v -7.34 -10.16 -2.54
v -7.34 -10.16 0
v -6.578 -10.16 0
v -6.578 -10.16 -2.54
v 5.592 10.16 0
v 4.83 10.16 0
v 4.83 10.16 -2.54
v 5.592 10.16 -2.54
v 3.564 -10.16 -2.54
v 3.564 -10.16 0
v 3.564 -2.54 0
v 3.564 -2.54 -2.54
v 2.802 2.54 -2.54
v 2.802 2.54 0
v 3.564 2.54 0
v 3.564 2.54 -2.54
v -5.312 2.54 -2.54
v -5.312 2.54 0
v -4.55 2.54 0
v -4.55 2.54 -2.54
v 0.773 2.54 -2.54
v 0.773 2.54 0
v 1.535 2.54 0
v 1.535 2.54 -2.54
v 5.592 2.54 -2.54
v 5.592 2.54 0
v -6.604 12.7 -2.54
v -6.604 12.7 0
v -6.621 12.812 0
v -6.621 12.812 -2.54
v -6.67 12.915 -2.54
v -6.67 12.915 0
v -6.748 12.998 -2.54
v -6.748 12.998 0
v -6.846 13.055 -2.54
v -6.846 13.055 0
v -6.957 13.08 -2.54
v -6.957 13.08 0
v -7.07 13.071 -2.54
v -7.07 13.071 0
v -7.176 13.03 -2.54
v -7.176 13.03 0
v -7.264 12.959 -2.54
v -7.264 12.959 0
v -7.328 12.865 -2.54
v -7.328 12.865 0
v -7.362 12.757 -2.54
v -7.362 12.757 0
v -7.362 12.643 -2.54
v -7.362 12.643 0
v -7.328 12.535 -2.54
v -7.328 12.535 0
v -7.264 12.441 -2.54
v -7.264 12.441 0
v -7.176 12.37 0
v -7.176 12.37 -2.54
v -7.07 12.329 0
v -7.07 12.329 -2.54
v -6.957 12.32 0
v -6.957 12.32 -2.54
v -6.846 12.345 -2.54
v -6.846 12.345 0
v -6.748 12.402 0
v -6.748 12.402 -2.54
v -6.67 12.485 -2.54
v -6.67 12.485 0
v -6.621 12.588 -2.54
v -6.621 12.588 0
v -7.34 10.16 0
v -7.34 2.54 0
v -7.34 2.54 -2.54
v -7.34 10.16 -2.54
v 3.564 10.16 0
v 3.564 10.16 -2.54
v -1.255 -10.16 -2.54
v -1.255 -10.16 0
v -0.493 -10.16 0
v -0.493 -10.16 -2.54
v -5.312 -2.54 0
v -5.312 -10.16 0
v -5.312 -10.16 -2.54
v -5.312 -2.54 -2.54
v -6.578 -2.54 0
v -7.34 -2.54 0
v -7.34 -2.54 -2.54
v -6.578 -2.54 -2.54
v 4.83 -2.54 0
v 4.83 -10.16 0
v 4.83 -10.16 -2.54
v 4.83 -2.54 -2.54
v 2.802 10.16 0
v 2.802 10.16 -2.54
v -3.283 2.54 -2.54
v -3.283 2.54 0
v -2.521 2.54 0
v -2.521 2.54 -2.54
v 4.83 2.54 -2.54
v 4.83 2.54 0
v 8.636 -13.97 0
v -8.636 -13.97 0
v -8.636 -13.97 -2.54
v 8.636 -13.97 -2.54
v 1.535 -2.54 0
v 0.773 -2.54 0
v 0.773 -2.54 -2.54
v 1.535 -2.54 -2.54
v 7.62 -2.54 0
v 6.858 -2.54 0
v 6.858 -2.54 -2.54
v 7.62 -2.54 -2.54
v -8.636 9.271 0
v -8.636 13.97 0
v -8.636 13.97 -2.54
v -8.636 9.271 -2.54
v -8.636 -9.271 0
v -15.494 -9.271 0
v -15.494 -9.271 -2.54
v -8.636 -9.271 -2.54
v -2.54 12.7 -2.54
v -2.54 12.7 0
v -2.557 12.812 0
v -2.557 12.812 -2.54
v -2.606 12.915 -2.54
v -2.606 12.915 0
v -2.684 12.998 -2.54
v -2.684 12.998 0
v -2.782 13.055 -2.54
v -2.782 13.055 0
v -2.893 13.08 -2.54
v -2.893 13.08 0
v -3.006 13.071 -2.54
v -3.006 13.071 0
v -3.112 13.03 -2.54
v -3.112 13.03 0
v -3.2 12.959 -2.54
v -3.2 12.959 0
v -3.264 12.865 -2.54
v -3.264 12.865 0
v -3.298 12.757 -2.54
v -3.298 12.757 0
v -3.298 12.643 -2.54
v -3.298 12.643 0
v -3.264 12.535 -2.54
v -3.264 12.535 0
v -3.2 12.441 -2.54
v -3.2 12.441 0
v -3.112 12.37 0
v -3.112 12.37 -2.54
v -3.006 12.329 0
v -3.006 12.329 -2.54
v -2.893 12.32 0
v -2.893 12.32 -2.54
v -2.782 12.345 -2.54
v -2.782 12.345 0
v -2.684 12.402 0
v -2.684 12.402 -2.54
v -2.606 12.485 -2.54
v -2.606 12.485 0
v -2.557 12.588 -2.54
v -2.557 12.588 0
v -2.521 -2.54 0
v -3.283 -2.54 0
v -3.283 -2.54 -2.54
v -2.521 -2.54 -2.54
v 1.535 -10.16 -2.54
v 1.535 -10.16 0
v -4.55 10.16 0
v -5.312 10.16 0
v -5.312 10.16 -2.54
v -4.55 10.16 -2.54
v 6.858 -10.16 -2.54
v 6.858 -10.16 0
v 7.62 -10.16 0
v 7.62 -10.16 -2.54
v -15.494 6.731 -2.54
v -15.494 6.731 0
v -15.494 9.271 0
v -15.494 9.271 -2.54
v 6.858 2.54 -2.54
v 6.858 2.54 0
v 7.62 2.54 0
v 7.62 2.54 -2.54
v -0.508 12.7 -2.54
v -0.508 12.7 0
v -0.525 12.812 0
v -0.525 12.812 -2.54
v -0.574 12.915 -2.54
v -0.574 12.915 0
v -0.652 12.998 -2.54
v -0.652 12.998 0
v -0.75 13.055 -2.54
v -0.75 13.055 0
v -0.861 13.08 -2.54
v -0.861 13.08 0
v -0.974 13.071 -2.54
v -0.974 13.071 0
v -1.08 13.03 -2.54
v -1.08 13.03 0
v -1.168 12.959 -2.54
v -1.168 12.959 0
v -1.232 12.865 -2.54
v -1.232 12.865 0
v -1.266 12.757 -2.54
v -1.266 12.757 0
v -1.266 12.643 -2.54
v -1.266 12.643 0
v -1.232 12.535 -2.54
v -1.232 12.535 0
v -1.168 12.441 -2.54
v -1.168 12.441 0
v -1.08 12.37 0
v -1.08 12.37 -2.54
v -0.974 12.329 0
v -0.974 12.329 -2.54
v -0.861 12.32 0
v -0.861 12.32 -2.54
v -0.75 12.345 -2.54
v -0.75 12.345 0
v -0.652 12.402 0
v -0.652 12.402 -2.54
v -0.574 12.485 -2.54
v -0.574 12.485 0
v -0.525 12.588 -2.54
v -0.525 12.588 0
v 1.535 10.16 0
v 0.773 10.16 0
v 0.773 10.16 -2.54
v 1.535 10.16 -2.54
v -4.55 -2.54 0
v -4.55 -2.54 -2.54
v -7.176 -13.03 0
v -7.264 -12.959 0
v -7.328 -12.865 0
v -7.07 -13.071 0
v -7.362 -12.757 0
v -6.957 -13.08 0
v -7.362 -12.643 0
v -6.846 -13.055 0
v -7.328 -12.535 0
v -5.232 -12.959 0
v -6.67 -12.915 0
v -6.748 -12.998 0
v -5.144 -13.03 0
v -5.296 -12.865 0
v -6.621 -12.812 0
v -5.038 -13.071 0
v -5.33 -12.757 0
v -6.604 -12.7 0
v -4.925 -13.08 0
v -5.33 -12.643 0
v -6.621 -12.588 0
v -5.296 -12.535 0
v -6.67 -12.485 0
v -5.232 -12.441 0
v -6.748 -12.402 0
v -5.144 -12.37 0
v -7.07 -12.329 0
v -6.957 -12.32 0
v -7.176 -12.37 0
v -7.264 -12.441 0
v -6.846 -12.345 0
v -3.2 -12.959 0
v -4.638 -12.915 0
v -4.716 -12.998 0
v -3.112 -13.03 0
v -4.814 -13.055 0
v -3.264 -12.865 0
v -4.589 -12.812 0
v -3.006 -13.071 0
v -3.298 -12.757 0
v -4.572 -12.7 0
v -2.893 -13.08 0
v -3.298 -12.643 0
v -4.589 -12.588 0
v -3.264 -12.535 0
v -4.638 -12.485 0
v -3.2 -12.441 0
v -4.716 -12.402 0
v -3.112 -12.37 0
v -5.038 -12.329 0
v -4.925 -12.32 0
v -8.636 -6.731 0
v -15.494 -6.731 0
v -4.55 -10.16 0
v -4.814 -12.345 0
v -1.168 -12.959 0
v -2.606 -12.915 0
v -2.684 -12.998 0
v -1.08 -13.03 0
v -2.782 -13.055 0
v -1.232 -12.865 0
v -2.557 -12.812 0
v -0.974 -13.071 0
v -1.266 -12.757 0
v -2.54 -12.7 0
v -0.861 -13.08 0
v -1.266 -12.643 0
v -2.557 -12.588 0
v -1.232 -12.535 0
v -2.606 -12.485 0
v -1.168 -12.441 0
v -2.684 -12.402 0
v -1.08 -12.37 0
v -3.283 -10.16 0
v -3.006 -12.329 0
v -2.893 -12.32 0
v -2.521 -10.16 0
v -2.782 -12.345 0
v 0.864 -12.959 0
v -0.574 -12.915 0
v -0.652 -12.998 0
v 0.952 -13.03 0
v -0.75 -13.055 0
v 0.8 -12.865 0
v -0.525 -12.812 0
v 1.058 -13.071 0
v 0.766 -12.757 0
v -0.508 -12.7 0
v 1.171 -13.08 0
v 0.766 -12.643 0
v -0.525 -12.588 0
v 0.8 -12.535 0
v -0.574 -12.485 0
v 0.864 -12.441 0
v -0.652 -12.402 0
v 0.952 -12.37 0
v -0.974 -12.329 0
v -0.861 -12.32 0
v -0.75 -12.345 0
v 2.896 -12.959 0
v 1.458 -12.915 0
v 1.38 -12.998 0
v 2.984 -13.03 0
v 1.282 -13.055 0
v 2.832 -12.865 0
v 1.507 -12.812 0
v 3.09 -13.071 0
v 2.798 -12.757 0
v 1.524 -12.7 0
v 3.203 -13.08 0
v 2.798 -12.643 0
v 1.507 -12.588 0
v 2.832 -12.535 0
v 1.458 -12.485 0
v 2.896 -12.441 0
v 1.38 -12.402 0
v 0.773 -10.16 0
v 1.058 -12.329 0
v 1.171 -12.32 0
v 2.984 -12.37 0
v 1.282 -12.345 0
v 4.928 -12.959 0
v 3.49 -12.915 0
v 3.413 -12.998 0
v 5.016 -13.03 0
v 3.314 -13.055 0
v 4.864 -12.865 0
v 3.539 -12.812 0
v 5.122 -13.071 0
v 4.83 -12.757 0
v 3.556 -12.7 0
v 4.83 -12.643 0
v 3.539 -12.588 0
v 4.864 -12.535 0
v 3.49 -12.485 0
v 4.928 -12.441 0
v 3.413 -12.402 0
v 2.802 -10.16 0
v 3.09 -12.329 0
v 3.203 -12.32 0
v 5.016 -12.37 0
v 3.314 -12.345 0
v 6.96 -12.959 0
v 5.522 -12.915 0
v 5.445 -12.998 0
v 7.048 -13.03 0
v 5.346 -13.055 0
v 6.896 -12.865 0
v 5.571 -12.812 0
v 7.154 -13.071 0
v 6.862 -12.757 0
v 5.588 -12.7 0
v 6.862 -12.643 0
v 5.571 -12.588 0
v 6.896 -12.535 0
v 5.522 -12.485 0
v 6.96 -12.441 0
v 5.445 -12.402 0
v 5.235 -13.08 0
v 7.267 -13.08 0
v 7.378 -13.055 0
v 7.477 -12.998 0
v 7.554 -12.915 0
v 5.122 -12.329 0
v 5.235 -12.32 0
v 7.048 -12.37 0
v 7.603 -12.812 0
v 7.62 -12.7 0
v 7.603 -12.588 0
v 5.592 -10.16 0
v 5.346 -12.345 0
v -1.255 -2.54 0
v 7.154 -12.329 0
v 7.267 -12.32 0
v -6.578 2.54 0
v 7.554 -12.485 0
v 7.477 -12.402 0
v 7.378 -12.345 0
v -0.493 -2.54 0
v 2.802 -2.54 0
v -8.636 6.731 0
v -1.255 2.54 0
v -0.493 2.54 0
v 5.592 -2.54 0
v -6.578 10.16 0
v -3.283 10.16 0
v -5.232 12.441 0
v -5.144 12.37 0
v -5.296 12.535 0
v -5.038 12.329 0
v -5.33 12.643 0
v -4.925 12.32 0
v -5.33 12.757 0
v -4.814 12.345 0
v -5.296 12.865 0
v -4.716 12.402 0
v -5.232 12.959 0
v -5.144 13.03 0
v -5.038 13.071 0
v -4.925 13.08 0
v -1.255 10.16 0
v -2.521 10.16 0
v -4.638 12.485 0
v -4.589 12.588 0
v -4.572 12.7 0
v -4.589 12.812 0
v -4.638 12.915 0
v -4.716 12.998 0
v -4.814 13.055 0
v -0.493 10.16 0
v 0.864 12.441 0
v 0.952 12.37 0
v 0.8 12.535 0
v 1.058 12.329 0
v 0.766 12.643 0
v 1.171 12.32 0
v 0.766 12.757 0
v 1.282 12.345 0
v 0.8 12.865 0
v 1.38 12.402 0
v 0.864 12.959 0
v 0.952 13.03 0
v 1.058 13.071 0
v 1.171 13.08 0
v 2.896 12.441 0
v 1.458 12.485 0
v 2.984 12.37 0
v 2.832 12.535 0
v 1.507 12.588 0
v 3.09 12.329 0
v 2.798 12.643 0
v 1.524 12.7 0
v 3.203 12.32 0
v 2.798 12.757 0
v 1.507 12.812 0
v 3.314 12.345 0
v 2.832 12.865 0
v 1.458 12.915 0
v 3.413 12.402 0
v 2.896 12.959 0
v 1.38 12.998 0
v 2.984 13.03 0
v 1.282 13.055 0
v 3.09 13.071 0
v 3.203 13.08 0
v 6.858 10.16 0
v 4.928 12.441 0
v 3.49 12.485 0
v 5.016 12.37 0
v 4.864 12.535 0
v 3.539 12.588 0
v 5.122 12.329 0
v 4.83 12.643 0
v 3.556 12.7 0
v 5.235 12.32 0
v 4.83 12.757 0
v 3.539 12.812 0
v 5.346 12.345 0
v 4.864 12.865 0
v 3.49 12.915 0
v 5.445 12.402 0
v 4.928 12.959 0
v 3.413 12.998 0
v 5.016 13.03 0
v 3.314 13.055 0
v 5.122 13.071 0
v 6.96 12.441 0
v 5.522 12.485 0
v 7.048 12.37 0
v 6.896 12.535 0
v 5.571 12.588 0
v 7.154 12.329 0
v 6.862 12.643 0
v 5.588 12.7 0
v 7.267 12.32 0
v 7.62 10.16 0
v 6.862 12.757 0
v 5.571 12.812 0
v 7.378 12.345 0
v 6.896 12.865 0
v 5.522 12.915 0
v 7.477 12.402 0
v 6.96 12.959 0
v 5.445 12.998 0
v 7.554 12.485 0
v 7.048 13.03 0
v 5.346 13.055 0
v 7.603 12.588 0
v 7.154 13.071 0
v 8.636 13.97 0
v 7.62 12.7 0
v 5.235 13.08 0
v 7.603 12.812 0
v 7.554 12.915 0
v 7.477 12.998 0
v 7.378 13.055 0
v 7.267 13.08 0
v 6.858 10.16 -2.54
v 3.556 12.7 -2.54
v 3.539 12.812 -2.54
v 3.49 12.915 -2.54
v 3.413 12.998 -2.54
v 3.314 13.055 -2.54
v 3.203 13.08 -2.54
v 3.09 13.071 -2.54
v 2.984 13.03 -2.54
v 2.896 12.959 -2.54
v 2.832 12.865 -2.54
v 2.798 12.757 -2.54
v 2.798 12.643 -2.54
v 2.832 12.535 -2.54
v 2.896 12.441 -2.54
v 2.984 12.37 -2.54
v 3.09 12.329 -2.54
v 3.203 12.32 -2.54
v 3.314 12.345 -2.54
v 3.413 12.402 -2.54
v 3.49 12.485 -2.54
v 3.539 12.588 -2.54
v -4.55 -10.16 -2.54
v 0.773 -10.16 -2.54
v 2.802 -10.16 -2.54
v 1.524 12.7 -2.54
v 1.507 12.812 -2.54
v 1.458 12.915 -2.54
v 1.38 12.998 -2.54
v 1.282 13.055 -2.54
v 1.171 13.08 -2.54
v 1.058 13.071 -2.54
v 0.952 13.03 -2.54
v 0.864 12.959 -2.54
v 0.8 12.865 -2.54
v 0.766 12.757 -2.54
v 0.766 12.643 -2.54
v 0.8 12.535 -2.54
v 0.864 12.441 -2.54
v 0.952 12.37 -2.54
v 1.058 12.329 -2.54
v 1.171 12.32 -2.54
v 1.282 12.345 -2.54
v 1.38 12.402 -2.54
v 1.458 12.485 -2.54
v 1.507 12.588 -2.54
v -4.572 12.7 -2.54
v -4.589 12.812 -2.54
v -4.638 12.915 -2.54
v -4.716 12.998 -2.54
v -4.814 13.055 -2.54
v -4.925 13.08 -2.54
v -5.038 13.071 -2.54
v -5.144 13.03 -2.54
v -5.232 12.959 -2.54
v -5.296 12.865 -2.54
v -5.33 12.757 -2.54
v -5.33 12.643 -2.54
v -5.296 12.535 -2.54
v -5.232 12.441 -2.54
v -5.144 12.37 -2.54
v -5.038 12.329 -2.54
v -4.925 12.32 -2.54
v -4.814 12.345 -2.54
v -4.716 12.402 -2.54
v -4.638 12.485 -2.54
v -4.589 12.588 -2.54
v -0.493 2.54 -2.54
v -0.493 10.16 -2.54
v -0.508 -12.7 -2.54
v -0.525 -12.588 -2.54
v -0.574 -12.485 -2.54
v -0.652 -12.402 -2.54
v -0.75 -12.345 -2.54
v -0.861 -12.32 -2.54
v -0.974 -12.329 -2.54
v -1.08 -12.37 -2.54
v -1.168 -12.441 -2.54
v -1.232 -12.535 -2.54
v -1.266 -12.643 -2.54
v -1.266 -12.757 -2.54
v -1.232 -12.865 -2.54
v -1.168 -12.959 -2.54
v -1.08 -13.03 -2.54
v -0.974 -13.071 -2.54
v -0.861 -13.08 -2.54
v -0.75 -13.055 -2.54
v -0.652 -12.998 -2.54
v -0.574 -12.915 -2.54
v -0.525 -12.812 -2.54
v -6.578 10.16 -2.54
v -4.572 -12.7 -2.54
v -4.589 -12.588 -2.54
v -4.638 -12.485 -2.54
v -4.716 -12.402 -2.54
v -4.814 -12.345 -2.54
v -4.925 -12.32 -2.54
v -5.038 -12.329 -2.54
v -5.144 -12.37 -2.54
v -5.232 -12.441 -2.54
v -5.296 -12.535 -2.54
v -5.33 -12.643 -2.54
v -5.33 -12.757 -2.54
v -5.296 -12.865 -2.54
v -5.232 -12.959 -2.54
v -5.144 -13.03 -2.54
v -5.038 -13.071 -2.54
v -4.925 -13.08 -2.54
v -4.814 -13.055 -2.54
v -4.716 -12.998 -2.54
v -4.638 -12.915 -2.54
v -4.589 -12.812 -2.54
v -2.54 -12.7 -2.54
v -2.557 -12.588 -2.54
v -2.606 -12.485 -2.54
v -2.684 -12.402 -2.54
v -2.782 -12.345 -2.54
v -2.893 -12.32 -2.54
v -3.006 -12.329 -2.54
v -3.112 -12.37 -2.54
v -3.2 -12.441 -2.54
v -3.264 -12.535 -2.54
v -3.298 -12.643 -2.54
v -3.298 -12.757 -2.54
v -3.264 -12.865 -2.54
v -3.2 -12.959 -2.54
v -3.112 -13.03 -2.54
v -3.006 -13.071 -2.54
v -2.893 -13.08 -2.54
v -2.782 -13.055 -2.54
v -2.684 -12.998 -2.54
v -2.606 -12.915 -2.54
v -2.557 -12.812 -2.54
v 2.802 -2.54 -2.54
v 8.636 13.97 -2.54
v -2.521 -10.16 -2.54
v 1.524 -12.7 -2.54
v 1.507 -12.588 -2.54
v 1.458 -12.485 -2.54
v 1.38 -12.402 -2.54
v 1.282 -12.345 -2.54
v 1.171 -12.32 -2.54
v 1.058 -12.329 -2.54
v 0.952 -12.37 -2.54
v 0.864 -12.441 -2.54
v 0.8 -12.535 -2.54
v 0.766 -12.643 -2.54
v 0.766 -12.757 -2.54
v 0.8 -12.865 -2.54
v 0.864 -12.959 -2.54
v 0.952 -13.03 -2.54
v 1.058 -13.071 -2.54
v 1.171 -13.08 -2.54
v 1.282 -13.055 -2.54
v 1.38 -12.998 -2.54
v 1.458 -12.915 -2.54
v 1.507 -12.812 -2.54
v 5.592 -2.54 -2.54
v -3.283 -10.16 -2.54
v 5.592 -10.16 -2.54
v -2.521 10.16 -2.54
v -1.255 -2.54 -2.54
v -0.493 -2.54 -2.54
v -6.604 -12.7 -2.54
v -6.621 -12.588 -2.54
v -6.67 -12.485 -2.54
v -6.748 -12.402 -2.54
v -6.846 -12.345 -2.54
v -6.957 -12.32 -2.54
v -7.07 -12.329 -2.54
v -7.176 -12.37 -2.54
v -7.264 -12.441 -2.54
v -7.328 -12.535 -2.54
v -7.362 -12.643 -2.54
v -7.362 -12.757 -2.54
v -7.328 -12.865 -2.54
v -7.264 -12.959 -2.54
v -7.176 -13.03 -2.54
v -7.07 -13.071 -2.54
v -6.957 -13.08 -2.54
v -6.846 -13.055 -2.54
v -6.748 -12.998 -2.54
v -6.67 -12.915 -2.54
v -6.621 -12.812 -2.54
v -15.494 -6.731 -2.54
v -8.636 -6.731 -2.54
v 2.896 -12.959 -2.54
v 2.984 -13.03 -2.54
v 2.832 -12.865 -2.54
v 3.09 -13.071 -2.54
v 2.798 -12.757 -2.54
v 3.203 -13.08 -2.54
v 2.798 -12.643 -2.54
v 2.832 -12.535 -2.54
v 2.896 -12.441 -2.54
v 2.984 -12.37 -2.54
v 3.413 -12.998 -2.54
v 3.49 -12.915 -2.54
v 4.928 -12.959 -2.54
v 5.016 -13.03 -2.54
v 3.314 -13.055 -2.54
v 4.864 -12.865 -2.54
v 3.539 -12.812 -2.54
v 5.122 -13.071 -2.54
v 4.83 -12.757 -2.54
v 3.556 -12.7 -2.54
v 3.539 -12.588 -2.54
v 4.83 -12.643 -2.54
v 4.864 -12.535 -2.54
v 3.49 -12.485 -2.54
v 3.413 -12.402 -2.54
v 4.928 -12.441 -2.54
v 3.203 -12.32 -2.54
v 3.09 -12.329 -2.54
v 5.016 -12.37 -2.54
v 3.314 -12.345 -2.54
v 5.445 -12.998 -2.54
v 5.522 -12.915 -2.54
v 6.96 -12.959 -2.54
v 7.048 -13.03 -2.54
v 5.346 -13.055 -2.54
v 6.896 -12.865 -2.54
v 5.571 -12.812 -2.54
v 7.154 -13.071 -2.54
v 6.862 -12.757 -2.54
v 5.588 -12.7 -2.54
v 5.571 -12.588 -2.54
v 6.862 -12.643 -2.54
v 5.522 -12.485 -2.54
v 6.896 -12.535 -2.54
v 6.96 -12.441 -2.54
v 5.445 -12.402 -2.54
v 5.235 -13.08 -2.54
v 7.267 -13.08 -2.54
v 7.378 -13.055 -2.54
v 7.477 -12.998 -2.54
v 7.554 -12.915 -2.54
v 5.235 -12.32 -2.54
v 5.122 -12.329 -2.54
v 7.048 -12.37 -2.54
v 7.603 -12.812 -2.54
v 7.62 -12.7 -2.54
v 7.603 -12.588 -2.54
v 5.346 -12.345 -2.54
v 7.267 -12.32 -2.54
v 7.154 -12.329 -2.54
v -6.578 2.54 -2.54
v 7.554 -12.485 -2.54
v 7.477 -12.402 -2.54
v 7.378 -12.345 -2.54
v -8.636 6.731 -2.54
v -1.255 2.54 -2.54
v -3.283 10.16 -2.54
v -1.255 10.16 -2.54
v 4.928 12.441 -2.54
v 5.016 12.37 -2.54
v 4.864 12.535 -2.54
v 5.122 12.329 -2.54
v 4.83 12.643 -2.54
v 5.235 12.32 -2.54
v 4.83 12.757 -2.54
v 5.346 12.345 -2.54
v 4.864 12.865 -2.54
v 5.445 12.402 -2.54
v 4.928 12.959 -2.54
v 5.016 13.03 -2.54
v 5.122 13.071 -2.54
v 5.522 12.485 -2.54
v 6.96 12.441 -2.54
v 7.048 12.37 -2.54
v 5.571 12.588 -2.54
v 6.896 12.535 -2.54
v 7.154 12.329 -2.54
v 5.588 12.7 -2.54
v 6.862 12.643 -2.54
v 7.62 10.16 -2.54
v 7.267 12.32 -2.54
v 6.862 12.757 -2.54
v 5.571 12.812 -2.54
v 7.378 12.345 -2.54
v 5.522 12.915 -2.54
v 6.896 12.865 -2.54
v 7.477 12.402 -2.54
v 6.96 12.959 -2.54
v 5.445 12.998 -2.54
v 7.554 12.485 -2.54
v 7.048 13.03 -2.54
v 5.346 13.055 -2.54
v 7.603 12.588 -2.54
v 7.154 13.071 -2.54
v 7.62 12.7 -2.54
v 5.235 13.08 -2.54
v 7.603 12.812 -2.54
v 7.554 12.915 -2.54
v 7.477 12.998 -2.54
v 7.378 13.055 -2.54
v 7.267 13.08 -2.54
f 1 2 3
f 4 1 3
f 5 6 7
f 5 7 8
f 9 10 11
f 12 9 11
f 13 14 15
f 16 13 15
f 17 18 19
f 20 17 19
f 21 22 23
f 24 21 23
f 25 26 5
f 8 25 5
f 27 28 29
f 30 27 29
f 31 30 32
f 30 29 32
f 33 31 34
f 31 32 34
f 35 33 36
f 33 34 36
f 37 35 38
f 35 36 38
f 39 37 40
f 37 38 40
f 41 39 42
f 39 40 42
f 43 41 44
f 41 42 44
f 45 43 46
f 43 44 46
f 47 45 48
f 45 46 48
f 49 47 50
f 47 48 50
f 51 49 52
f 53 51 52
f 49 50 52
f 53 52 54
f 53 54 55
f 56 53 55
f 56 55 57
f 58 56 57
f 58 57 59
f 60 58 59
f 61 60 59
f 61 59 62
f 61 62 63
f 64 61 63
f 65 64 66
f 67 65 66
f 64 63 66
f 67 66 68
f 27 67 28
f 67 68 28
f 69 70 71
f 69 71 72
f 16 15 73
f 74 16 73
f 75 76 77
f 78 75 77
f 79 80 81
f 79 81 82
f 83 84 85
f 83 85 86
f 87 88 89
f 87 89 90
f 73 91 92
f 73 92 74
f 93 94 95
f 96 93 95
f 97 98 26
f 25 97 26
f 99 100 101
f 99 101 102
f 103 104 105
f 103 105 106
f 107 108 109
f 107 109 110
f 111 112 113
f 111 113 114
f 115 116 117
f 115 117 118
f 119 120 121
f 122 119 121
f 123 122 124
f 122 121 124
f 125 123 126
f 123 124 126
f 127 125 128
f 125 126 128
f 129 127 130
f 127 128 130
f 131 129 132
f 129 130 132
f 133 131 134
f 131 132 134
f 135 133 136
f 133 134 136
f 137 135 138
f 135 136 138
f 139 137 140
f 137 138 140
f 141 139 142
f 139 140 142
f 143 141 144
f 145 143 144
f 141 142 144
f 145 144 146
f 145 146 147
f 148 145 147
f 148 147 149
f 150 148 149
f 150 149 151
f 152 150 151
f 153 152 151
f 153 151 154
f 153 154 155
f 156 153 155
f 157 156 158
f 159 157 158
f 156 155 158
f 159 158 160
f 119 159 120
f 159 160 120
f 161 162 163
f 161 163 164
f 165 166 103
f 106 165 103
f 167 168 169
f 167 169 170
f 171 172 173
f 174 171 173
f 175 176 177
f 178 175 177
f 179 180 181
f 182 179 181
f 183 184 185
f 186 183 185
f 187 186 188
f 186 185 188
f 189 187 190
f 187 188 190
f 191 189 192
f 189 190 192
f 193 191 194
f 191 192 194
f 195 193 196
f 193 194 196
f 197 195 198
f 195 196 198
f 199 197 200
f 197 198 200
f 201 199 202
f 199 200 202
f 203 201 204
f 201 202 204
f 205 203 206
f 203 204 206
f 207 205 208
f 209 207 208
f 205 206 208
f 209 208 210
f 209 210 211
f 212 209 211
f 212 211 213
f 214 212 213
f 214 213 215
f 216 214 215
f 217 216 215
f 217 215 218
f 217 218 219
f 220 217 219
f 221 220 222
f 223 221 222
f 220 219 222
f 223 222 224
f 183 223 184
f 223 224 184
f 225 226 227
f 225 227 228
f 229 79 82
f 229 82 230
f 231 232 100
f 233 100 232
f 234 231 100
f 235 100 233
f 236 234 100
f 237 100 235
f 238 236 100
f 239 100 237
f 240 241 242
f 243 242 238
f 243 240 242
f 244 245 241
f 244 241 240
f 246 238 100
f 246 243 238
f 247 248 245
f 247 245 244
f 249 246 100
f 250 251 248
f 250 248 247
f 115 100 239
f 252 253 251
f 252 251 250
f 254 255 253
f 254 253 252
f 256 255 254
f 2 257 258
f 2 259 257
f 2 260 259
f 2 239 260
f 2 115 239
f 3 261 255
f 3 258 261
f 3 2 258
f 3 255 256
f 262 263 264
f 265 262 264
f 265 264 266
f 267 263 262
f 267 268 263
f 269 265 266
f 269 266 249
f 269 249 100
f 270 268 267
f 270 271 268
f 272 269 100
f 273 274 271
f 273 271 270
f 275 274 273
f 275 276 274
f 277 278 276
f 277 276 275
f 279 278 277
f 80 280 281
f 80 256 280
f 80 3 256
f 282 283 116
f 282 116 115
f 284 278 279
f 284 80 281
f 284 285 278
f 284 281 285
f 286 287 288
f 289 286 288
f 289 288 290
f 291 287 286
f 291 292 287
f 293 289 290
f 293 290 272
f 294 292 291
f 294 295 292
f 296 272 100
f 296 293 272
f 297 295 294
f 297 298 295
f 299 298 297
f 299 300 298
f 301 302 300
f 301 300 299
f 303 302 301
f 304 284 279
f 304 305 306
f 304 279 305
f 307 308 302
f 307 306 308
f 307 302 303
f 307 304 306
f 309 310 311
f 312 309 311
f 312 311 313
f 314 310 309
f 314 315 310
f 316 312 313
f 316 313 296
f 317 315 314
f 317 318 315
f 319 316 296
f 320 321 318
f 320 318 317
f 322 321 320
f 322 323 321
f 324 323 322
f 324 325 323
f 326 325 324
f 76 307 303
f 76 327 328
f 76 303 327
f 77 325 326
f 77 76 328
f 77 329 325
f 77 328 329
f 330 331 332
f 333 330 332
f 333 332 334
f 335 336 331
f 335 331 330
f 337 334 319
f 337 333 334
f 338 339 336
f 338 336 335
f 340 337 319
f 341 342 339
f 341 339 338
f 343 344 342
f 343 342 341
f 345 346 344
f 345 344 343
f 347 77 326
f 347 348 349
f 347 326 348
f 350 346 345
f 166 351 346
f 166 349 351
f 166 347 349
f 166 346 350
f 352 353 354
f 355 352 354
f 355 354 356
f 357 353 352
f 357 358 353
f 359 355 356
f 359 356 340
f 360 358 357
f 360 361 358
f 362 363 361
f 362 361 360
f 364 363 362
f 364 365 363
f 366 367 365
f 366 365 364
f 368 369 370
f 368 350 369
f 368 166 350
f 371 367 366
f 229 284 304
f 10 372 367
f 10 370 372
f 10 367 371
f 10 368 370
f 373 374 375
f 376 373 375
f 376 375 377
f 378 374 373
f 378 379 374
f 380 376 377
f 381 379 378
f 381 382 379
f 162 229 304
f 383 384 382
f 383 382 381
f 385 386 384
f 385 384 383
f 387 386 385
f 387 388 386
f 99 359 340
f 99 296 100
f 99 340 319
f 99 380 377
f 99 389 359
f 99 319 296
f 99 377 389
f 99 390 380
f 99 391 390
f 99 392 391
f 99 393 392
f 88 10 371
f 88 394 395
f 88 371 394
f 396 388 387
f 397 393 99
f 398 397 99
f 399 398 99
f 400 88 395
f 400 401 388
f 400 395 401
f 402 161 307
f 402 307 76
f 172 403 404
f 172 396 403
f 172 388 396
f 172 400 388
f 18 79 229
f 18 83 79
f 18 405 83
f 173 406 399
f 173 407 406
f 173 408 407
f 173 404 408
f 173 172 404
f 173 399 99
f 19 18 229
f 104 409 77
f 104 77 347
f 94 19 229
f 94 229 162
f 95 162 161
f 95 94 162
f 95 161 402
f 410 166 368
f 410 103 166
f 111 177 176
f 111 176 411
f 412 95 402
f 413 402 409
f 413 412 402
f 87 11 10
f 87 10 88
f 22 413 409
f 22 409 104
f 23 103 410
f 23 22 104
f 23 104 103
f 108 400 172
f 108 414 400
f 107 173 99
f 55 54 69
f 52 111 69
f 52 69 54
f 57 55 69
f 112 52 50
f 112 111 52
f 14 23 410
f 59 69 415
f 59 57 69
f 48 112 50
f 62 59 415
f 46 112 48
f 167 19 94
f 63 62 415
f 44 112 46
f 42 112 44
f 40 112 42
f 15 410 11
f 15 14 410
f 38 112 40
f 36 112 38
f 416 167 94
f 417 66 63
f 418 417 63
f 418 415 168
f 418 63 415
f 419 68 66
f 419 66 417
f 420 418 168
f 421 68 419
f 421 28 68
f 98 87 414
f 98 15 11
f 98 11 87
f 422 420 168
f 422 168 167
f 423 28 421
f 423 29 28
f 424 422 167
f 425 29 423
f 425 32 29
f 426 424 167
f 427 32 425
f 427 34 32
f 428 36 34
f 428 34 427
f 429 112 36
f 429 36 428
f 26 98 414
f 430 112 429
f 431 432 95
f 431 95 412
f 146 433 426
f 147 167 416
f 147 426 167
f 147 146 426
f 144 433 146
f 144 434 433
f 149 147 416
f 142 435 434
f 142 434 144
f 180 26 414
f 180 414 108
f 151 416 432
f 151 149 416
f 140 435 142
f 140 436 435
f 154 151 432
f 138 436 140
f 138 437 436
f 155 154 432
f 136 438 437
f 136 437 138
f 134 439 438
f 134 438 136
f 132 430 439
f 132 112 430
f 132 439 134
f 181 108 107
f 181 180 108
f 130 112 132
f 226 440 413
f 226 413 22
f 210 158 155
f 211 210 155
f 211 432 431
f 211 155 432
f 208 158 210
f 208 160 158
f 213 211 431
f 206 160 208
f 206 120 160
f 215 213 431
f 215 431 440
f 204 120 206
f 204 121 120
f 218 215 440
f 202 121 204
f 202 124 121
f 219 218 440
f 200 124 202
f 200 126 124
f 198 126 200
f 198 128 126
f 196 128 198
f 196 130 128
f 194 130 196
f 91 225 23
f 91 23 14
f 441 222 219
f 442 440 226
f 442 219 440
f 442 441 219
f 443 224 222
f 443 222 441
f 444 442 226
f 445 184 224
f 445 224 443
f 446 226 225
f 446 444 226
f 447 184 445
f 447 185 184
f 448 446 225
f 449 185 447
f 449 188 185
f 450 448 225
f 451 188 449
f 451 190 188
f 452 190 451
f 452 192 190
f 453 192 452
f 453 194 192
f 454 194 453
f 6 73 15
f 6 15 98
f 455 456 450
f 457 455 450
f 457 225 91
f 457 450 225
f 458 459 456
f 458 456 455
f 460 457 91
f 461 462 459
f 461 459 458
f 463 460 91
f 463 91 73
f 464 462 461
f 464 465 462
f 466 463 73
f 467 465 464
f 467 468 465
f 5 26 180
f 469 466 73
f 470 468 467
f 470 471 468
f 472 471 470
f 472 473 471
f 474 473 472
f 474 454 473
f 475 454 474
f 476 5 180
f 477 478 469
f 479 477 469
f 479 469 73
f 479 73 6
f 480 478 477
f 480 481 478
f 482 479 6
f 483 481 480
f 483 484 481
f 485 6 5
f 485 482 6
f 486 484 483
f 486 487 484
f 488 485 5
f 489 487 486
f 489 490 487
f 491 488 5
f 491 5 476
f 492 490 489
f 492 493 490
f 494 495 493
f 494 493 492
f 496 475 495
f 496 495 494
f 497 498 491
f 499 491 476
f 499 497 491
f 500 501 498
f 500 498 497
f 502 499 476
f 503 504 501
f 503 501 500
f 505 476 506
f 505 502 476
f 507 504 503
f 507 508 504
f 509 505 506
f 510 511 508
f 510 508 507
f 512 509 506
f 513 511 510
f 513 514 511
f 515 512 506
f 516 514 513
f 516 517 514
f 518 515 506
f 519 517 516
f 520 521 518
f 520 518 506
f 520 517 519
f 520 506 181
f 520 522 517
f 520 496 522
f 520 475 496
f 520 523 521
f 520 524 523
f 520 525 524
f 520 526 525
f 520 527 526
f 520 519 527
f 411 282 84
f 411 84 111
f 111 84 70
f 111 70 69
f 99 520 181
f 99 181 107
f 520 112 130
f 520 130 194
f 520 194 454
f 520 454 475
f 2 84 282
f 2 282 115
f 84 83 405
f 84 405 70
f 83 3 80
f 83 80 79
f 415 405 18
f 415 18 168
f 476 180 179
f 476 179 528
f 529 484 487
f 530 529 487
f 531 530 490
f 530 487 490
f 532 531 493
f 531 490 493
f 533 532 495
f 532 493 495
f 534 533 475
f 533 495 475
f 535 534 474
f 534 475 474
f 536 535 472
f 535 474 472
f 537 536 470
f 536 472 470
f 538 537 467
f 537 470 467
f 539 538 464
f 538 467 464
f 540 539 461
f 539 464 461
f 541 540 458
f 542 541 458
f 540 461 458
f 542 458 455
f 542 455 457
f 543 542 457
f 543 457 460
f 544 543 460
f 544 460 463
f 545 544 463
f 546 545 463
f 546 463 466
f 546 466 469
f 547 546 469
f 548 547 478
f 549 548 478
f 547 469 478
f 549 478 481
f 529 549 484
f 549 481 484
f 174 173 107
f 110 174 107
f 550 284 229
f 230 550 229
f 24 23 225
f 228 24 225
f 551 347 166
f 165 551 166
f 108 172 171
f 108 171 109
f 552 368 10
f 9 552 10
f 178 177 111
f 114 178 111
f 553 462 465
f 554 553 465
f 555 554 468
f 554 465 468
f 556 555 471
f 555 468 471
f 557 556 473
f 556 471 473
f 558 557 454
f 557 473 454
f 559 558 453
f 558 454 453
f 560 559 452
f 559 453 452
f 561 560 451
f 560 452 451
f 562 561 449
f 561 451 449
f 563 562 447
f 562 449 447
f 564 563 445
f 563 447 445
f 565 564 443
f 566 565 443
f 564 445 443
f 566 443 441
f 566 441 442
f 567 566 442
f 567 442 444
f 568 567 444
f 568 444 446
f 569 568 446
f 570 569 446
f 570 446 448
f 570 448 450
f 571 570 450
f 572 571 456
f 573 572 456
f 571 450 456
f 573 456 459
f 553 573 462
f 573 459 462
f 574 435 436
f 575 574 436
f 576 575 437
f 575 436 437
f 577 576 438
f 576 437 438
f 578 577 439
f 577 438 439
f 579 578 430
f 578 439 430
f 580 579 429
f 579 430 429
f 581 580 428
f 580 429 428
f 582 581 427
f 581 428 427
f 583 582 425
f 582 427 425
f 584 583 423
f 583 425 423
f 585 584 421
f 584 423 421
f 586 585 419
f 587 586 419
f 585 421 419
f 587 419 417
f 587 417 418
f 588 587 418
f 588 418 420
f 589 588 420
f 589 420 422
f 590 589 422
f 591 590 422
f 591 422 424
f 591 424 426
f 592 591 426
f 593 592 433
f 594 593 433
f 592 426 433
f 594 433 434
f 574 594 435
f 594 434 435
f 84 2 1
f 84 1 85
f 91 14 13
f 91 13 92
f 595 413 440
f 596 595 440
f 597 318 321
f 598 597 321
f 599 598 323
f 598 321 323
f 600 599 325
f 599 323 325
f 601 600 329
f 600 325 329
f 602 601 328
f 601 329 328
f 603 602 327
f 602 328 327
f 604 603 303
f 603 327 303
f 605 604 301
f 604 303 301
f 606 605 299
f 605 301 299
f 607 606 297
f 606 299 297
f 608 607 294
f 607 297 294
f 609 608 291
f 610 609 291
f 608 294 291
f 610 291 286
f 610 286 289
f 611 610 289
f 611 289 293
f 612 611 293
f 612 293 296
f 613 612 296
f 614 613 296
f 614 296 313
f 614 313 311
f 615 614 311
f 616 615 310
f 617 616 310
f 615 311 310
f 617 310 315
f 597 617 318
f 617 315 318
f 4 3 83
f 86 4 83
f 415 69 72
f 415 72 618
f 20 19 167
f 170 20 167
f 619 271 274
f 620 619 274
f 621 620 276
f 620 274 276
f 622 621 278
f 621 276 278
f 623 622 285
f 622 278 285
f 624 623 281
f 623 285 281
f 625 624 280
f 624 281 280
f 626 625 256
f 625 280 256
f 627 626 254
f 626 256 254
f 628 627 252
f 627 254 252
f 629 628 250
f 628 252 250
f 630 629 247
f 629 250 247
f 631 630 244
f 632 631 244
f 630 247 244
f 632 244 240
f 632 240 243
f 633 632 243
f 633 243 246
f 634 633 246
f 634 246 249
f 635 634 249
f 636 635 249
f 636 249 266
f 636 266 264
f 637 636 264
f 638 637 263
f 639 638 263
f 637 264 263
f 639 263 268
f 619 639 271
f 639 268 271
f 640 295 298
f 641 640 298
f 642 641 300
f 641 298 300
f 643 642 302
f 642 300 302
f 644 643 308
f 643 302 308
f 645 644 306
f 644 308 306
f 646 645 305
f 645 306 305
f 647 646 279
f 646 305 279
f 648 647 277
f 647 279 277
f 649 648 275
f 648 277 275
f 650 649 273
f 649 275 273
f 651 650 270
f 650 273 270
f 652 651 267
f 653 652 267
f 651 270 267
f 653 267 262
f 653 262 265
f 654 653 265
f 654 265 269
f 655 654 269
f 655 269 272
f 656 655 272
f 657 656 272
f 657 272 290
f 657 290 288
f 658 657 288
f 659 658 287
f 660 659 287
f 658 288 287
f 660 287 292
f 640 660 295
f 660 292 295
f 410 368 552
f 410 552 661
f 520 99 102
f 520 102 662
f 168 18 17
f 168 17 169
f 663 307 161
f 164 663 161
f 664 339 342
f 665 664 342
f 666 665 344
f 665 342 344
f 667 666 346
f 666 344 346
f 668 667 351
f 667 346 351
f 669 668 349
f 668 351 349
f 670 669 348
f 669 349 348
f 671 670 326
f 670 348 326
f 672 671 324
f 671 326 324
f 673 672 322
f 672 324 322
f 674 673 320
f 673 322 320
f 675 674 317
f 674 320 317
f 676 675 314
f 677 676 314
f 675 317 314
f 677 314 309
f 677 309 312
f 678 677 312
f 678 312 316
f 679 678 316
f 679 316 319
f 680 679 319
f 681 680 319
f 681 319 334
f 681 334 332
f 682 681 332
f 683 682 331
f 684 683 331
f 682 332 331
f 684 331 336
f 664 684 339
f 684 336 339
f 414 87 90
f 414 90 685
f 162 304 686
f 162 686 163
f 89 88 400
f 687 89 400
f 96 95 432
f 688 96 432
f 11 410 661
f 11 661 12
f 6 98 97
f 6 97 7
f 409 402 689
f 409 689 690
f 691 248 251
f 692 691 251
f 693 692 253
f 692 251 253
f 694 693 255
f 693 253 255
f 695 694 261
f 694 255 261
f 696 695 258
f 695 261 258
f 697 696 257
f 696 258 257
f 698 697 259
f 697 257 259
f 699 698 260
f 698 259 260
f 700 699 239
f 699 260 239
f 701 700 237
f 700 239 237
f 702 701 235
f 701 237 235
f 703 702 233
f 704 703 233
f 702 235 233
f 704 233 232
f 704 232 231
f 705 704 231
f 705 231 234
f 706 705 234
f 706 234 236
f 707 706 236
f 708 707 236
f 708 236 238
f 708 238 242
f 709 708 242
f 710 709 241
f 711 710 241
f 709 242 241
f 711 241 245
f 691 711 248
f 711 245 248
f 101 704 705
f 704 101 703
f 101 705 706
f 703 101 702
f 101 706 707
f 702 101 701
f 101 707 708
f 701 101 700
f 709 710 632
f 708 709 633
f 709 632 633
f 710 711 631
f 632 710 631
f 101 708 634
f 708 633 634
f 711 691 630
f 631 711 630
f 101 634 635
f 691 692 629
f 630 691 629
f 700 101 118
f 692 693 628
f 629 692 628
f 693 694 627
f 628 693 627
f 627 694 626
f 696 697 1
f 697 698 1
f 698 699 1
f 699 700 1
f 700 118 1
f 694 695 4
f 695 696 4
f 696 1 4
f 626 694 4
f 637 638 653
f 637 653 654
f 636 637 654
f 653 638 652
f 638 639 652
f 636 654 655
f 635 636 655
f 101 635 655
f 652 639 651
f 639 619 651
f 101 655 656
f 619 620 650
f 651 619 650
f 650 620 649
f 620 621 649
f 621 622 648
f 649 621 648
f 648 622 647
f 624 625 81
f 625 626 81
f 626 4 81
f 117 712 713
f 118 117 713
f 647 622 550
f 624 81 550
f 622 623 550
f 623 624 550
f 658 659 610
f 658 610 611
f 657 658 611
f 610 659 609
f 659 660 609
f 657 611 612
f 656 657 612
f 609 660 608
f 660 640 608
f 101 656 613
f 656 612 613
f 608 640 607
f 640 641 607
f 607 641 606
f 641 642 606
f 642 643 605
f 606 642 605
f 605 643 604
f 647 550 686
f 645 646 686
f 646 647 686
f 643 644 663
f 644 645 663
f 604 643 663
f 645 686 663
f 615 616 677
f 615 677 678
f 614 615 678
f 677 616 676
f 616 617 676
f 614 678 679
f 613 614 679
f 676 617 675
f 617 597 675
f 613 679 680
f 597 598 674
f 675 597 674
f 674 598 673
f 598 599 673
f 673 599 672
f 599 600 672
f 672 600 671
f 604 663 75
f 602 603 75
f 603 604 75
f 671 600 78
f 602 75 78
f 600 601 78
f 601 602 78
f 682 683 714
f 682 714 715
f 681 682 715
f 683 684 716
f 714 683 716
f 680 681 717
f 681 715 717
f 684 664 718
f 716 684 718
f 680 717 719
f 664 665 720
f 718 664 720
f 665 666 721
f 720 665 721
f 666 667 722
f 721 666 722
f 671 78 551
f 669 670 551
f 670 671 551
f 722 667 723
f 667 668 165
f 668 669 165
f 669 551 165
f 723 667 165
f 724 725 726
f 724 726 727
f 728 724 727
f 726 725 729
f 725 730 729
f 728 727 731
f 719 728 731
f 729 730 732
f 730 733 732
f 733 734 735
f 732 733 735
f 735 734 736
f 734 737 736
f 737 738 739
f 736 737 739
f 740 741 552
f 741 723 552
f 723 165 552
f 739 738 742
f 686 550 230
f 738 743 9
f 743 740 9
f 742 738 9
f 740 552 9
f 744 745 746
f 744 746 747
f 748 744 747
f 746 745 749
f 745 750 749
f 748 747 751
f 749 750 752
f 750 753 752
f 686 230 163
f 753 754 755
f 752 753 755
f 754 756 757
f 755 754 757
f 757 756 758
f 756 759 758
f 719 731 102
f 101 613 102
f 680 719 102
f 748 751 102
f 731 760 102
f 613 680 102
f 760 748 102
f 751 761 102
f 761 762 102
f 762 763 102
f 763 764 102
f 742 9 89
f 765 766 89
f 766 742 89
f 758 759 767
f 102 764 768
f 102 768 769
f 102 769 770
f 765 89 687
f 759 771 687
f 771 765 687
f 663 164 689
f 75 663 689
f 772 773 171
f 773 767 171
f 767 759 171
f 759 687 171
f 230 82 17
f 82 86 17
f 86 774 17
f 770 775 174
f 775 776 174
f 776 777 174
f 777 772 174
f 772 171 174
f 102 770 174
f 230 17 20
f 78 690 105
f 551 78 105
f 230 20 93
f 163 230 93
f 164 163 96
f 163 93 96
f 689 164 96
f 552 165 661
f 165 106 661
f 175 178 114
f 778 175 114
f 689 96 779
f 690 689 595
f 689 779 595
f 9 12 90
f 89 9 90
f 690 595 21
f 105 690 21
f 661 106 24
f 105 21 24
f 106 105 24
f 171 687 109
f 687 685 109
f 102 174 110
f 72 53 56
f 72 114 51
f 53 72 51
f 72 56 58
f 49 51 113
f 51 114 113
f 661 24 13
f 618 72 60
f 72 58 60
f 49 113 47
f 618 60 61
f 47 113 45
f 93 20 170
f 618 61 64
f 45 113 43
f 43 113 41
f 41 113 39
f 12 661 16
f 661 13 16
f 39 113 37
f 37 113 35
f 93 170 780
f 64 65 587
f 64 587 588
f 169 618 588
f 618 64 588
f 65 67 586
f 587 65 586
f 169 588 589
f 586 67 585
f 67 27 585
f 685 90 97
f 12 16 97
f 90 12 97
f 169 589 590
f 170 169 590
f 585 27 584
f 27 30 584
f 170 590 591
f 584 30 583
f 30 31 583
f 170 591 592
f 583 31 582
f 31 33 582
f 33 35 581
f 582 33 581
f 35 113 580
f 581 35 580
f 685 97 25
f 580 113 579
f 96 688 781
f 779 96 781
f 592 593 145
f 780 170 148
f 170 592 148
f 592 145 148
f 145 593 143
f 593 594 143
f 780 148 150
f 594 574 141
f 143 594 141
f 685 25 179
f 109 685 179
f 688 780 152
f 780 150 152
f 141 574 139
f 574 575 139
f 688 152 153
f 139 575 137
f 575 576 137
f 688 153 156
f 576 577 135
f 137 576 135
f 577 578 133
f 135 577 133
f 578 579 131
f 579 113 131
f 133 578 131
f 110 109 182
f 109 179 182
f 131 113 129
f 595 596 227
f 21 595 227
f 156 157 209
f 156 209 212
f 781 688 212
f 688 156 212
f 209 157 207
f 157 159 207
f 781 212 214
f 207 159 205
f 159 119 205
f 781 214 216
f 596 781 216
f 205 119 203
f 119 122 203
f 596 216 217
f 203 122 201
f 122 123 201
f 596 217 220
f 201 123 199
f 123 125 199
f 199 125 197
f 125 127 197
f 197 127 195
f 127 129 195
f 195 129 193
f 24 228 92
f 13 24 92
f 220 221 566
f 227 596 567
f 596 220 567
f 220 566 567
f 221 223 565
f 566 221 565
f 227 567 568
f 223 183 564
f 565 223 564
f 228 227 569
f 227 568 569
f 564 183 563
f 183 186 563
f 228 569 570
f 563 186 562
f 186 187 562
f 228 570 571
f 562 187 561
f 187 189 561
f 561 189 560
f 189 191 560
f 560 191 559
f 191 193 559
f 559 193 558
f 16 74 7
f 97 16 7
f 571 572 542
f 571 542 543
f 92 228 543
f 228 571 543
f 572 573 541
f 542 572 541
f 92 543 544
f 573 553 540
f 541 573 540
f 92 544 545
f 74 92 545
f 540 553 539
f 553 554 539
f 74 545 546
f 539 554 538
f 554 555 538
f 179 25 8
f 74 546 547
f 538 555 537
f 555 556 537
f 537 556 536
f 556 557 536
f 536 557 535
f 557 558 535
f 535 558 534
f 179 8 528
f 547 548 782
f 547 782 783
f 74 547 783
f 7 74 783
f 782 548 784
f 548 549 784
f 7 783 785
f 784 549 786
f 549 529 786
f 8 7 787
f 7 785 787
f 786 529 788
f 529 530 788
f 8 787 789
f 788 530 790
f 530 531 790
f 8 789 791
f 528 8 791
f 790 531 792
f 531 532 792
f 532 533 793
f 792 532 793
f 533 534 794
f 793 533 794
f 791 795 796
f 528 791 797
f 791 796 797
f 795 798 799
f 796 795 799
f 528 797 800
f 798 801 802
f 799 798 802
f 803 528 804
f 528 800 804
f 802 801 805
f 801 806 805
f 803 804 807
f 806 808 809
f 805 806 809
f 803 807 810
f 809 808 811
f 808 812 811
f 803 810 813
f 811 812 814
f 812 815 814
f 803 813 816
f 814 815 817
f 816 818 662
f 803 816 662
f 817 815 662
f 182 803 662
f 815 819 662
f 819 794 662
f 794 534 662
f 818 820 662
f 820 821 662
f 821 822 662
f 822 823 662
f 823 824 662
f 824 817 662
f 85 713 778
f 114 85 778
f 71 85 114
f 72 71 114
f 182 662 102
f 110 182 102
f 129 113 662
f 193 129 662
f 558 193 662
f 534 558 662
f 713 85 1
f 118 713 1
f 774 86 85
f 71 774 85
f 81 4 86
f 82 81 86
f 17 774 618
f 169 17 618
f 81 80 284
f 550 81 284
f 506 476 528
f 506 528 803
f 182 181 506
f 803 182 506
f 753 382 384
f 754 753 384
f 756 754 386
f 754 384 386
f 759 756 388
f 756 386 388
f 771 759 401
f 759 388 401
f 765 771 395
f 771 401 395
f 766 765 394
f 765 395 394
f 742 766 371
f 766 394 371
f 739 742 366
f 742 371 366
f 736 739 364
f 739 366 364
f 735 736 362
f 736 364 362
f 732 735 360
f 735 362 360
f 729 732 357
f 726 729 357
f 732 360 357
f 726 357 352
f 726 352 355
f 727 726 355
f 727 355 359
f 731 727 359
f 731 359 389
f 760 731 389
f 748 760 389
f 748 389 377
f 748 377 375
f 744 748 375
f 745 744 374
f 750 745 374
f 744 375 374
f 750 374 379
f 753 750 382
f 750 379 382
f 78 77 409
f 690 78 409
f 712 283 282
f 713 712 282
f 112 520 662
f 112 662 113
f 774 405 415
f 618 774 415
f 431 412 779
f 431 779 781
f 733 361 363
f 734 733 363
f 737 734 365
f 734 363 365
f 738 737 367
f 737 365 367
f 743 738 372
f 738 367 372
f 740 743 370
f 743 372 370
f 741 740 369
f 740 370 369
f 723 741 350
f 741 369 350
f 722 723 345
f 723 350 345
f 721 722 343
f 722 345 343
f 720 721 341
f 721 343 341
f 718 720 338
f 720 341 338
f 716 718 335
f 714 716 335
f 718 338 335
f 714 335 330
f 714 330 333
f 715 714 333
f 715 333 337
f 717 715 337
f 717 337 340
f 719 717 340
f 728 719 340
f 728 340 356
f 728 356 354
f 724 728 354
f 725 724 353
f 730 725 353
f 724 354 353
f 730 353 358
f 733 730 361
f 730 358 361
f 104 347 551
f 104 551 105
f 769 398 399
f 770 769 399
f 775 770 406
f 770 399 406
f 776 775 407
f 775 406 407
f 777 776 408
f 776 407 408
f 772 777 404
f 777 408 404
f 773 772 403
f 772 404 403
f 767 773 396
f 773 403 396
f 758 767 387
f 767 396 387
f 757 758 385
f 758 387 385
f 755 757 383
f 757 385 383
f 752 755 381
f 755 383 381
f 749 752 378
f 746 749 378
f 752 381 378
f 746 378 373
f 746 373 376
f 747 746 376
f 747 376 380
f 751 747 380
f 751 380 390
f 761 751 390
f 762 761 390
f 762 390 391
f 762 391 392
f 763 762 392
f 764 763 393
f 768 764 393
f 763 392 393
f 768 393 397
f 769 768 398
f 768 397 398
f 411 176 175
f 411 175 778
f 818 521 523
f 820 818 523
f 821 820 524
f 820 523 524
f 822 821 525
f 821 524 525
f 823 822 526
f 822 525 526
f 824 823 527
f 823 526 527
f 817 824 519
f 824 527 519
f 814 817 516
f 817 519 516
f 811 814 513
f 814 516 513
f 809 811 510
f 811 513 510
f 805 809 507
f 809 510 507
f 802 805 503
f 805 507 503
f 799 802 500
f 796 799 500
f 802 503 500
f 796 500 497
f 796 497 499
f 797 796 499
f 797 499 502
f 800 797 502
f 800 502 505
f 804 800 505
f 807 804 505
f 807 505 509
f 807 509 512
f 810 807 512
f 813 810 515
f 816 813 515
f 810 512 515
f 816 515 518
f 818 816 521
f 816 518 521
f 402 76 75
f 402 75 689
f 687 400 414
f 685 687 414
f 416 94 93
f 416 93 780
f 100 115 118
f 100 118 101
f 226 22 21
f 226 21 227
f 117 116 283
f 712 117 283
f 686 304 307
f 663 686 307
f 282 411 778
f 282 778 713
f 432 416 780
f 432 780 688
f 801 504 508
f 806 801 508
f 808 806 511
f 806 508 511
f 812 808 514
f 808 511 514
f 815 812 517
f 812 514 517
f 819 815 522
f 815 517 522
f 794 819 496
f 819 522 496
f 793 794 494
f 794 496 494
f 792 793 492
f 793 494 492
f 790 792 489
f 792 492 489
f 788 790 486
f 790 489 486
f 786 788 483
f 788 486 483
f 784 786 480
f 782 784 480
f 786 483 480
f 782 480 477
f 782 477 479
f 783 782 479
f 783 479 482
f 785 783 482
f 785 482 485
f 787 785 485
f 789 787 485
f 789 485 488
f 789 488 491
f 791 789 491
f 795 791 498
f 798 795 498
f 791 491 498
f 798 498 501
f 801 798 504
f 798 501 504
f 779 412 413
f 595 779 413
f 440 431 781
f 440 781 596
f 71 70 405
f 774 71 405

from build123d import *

# Parameters (mm, degrees)
F0_W     = 6.858
F0_H     = 2.54
F0_R     = 0.381
F0_W_2   = 0.762
F0_H_2   = 7.62
F1_DEPTH = 2.54


with BuildPart() as f1:
    # F0 (on Top) → F1 (new body)
    with BuildSketch(Plane.XY):
        with Locations((-12.065, 8.001)):
            Rectangle(F0_W, F0_H)
        with Locations((-12.065, -8.001)):
            Rectangle(F0_W, F0_H)
        Polygon((8.636, -13.97), (8.636, 13.97), (-8.636, 13.97), (-8.636, 9.271), (-8.636, 6.731), (-8.636, -6.731), (-8.636, -9.271), (-8.636, -13.97), align=None)
        with Locations((-6.98514, -12.7)):
            Circle(F0_R, mode=Mode.SUBTRACT)
        with Locations((-4.95312, -12.7)):
            Circle(F0_R, mode=Mode.SUBTRACT)
        with Locations((-6.95875, -6.35)):
            Rectangle(F0_W_2, F0_H_2, mode=Mode.SUBTRACT)
        with Locations((-4.9305, -6.35)):
            Rectangle(F0_W_2, F0_H_2, mode=Mode.SUBTRACT)
        with Locations((-2.9211, -12.7)):
            Circle(F0_R, mode=Mode.SUBTRACT)
        with Locations((-0.88908, -12.7)):
            Circle(F0_R, mode=Mode.SUBTRACT)
        with Locations((1.14294, -12.7)):
            Circle(F0_R, mode=Mode.SUBTRACT)
        with Locations((3.17496, -12.7)):
            Circle(F0_R, mode=Mode.SUBTRACT)
        with Locations((5.20698, -12.7)):
            Circle(F0_R, mode=Mode.SUBTRACT)
        with Locations((7.239, -12.7)):
            Circle(F0_R, mode=Mode.SUBTRACT)
        with Locations((-2.90225, -6.35)):
            Rectangle(F0_W_2, F0_H_2, mode=Mode.SUBTRACT)
        with Locations((-0.874, -6.35)):
            Rectangle(F0_W_2, F0_H_2, mode=Mode.SUBTRACT)
        with Locations((1.15425, -6.35)):
            Rectangle(F0_W_2, F0_H_2, mode=Mode.SUBTRACT)
        with Locations((3.1825, -6.35)):
            Rectangle(F0_W_2, F0_H_2, mode=Mode.SUBTRACT)
        with Locations((5.21075, -6.35)):
            Rectangle(F0_W_2, F0_H_2, mode=Mode.SUBTRACT)
        with Locations((7.239, -6.35)):
            Rectangle(F0_W_2, F0_H_2, mode=Mode.SUBTRACT)
        with Locations((-6.95875, 6.35)):
            Rectangle(F0_W_2, F0_H_2, mode=Mode.SUBTRACT)
        with Locations((-4.9305, 6.35)):
            Rectangle(F0_W_2, F0_H_2, mode=Mode.SUBTRACT)
        with Locations((-6.98514, 12.7)):
            Circle(F0_R, mode=Mode.SUBTRACT)
        with Locations((-4.95312, 12.7)):
            Circle(F0_R, mode=Mode.SUBTRACT)
        with Locations((-2.90225, 6.35)):
            Rectangle(F0_W_2, F0_H_2, mode=Mode.SUBTRACT)
        with Locations((-0.874, 6.35)):
            Rectangle(F0_W_2, F0_H_2, mode=Mode.SUBTRACT)
        with Locations((1.15425, 6.35)):
            Rectangle(F0_W_2, F0_H_2, mode=Mode.SUBTRACT)
        with Locations((3.1825, 6.35)):
            Rectangle(F0_W_2, F0_H_2, mode=Mode.SUBTRACT)
        with Locations((5.21075, 6.35)):
            Rectangle(F0_W_2, F0_H_2, mode=Mode.SUBTRACT)
        with Locations((7.239, 6.35)):
            Rectangle(F0_W_2, F0_H_2, mode=Mode.SUBTRACT)
        with Locations((-2.9211, 12.7)):
            Circle(F0_R, mode=Mode.SUBTRACT)
        with Locations((-0.88908, 12.7)):
            Circle(F0_R, mode=Mode.SUBTRACT)
        with Locations((1.14294, 12.7)):
            Circle(F0_R, mode=Mode.SUBTRACT)
        with Locations((3.17496, 12.7)):
            Circle(F0_R, mode=Mode.SUBTRACT)
        with Locations((5.20698, 12.7)):
            Circle(F0_R, mode=Mode.SUBTRACT)
        with Locations((7.239, 12.7)):
            Circle(F0_R, mode=Mode.SUBTRACT)
    extrude(amount=-F1_DEPTH)


solid = f1.part
